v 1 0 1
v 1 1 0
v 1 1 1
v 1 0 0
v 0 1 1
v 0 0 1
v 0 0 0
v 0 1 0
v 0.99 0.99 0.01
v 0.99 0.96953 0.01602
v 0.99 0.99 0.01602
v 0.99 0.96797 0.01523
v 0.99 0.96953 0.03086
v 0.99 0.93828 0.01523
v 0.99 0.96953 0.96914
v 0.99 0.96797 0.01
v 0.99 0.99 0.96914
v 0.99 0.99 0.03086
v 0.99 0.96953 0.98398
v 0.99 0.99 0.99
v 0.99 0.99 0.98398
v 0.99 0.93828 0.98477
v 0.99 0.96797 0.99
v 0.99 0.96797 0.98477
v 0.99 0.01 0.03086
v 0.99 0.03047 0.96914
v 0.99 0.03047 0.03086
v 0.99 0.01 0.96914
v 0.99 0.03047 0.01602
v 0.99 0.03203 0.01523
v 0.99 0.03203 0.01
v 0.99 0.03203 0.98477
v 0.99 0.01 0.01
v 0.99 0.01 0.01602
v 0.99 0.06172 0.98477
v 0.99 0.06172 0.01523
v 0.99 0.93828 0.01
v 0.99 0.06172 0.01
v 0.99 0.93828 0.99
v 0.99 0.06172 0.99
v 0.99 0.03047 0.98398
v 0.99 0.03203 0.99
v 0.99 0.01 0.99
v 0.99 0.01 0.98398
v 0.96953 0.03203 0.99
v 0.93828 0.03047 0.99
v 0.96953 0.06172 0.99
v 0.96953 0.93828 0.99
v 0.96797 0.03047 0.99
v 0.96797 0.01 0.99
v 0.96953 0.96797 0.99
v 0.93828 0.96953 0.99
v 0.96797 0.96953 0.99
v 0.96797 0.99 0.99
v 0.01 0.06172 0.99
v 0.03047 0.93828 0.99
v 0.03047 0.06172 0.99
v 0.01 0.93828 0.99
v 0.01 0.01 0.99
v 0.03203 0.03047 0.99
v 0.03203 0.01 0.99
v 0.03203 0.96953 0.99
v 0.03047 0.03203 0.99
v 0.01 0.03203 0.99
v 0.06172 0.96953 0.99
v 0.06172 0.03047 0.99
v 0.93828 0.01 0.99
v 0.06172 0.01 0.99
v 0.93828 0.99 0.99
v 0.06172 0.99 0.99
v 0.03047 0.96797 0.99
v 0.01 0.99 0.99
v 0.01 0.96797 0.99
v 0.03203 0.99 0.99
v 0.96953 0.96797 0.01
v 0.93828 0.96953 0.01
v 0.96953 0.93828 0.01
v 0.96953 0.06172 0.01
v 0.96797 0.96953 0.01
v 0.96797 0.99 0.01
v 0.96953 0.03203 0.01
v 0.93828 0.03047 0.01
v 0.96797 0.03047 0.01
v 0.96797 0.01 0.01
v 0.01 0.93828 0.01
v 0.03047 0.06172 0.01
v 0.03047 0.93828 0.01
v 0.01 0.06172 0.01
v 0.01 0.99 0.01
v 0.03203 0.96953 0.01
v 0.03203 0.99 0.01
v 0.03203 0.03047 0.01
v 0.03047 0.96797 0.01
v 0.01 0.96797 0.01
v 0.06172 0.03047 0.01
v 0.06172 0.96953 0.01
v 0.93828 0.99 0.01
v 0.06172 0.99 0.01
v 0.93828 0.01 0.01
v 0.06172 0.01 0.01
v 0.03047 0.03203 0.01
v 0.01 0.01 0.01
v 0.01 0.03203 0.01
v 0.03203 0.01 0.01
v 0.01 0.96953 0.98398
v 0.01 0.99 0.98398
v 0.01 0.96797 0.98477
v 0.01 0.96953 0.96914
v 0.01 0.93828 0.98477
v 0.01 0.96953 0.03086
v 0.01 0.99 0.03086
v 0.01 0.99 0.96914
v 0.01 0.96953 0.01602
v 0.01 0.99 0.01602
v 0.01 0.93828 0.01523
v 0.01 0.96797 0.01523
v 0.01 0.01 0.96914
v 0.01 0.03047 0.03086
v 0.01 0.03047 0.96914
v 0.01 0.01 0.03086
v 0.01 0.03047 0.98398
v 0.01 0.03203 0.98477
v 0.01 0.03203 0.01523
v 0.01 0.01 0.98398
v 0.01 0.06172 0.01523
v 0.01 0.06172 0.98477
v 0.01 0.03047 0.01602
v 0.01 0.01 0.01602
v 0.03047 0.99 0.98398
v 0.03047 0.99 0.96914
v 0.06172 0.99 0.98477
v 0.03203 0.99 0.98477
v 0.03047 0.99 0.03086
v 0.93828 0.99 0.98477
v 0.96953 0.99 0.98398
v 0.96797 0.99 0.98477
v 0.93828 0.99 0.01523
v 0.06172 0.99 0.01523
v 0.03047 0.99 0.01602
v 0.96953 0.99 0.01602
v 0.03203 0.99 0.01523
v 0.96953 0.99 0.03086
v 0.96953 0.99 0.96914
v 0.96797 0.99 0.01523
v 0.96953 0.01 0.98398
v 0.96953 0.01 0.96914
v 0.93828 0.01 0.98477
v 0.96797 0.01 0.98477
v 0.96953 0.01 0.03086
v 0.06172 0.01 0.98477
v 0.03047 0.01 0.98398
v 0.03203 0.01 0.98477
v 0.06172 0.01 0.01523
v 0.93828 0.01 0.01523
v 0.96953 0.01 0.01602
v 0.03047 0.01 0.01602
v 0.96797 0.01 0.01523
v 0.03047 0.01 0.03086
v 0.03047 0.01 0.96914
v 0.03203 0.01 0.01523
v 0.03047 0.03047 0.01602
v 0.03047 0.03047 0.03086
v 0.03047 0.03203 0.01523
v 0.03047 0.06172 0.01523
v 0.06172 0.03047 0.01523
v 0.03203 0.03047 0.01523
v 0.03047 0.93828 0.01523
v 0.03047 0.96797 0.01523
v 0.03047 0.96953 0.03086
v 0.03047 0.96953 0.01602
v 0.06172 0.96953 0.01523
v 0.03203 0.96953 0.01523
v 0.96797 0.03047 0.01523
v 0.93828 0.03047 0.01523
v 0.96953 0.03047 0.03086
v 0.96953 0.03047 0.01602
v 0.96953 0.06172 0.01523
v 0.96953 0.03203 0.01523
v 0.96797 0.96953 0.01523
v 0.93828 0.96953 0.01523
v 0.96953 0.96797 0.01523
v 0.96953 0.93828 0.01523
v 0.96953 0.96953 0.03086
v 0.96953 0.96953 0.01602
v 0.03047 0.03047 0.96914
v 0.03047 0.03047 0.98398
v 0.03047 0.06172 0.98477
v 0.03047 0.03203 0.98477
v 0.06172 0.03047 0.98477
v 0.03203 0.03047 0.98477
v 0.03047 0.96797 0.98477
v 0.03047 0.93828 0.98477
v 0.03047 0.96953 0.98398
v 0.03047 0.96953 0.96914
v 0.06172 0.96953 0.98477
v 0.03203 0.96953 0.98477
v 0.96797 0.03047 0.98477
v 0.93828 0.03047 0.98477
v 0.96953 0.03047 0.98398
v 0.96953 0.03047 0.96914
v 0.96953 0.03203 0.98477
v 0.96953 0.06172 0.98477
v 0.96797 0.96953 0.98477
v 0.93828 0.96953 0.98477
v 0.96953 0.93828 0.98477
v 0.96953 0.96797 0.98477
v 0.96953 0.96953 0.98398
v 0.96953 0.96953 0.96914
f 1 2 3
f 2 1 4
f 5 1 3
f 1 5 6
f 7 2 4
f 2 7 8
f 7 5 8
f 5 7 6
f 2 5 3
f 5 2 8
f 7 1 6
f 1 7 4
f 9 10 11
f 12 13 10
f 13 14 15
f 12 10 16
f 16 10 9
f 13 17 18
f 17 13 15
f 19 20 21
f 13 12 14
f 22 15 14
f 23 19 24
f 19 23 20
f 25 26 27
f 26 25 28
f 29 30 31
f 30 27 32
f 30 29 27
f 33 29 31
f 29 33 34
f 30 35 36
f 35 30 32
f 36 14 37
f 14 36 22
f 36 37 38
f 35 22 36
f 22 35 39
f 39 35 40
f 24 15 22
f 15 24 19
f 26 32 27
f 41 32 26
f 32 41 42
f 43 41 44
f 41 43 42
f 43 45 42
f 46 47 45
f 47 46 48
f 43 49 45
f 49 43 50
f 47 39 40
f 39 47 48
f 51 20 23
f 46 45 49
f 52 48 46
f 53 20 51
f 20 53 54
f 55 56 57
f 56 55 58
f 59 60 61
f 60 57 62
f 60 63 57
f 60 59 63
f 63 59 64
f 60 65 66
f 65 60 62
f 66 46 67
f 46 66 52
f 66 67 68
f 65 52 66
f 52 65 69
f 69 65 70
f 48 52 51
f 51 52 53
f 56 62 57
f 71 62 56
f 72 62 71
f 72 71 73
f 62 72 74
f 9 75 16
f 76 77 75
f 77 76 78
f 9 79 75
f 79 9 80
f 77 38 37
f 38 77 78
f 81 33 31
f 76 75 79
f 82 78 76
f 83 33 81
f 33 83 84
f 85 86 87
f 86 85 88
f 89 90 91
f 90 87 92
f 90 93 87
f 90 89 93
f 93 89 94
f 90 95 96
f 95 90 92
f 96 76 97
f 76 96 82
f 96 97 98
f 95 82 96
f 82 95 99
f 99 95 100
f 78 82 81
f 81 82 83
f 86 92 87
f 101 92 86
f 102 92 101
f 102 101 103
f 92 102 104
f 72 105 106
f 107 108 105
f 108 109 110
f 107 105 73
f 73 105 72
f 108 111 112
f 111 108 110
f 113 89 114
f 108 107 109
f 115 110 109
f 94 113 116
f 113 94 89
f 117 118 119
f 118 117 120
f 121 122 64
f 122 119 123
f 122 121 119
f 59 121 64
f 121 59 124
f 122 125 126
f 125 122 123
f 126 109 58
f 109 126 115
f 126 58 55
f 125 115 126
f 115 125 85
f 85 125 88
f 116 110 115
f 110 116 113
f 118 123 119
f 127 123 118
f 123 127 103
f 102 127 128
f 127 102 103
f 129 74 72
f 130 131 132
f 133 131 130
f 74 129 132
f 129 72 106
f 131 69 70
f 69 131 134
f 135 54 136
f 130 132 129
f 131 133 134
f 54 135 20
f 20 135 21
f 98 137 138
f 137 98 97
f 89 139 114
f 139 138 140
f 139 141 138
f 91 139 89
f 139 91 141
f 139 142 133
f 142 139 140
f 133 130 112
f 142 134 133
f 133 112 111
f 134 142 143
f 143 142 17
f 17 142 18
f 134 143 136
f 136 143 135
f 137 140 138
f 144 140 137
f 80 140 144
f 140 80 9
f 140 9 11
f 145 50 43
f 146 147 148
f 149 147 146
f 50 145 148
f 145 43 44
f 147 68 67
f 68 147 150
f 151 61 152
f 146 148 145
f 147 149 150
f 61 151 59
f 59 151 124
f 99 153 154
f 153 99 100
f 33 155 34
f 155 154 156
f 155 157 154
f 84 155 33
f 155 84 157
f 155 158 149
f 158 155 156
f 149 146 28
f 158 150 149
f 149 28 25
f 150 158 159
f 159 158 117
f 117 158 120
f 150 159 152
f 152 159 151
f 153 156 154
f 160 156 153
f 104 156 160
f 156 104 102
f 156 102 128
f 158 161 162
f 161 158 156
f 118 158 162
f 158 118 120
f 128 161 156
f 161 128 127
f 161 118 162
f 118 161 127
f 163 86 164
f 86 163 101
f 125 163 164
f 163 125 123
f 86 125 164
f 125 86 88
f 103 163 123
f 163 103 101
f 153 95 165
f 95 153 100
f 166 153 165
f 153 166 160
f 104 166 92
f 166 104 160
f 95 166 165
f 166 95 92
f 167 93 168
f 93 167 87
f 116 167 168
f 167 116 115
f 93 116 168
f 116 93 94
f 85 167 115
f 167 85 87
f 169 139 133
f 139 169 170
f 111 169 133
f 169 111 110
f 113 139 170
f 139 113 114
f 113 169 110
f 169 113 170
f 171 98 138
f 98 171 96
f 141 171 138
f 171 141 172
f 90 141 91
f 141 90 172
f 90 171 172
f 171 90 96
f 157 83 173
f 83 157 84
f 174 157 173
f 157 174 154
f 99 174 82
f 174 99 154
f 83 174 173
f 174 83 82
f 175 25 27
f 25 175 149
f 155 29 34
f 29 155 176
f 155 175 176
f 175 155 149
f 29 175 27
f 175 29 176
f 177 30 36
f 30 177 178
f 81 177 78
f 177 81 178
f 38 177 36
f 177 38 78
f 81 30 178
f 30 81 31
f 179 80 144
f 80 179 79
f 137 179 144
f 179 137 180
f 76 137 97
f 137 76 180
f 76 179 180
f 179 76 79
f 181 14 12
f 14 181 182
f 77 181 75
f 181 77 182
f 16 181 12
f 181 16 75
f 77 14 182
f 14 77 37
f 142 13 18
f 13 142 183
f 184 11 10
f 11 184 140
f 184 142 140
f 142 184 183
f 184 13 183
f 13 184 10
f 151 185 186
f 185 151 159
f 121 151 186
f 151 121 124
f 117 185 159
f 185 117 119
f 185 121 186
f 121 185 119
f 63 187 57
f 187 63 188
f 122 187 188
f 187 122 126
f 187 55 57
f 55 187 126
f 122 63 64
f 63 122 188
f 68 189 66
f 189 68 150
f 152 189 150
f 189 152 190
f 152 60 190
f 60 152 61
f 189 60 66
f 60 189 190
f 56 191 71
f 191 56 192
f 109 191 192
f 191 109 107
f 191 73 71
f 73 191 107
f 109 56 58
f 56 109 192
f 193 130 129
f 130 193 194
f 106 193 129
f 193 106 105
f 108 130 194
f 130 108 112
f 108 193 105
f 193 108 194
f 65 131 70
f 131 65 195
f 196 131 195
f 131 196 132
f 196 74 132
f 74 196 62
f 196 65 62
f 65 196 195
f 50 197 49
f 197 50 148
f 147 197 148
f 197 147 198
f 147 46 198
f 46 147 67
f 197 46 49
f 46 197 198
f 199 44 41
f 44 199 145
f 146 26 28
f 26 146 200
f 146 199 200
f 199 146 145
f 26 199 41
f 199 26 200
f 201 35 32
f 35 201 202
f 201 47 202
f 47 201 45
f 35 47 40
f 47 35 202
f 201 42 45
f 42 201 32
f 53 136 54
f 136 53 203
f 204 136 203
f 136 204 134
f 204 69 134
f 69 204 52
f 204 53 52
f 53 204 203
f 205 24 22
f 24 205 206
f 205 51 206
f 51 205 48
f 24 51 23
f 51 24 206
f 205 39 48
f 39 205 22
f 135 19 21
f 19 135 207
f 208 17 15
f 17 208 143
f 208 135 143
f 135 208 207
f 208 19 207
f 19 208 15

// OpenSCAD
translate([0.015625, 0.015625, 0.0234375]) color([0.9159839408953577, 0.5842491446465958, 0.794562993834622]) cube([0.0296875, 0.0296875, 0.01484375], center=true);
translate([0.015625, 0.046875, 0.0078125]) color([0.7628318471167657, 0.678963192096452, 0.8649334958146554]) cube([0.0296875, 0.0296875, 0.01484375], center=true);
translate([0.046875, 0.015625, 0.0078125]) color([0.3186621910375238, 0.8354161715679529, 0.826829547153697]) cube([0.0296875, 0.0296875, 0.01484375], center=true);
translate([0.015625, 0.953125, 0.0078125]) color([0.11738075374887624, 0.05498692879855205, 0.6720606658768808]) cube([0.0296875, 0.0296875, 0.01484375], center=true);
translate([0.015625, 0.984375, 0.0234375]) color([0.48227079704185694, 0.2633045439878229, 0.7871728303492512]) cube([0.0296875, 0.0296875, 0.01484375], center=true);
translate([0.046875, 0.984375, 0.0078125]) color([0.4889110107686552, 0.4598642681367189, 0.3017002002562994]) cube([0.0296875, 0.0296875, 0.01484375], center=true);
translate([0.953125, 0.015625, 0.0078125]) color([0.7097667730124154, 0.7732643589874595, 0.6040908296302202]) cube([0.0296875, 0.0296875, 0.01484375], center=true);
translate([0.984375, 0.015625, 0.0234375]) color([0.4404602571783507, 0.4387519946284576, 0.3139475975701921]) cube([0.0296875, 0.0296875, 0.01484375], center=true);
translate([0.984375, 0.046875, 0.0078125]) color([0.7902430565580089, 0.5929973639780046, 0.11888070100193193]) cube([0.0296875, 0.0296875, 0.01484375], center=true);
translate([0.953125, 0.984375, 0.0078125]) color([0.8882067612786162, 0.5183696497459783, 0.37722276013901157]) cube([0.0296875, 0.0296875, 0.01484375], center=true);
translate([0.984375, 0.953125, 0.0078125]) color([0.34378061705655194, 0.680122784193144, 0.28765609338386733]) cube([0.0296875, 0.0296875, 0.01484375], center=true);
translate([0.984375, 0.984375, 0.0234375]) color([0.5132044160193727, 0.948679865315508, 0.5051172012919322]) cube([0.0296875, 0.0296875, 0.01484375], center=true);
translate([0.015625, 0.015625, 0.9765625]) color([0.24094793536178727, 0.7348070855940613, 0.6317801561016791]) cube([0.0296875, 0.0296875, 0.01484375], center=true);
translate([0.015625, 0.046875, 0.9921875]) color([0.4449433647546056, 0.9178984262554764, 0.13307521746456363]) cube([0.0296875, 0.0296875, 0.01484375], center=true);
translate([0.046875, 0.015625, 0.9921875]) color([0.7079100199767676, 0.1836532406516047, 0.9272673117871152]) cube([0.0296875, 0.0296875, 0.01484375], center=true);
translate([0.015625, 0.953125, 0.9921875]) color([0.9770711363883782, 0.21964399595921047, 0.7456964983989979]) cube([0.0296875, 0.0296875, 0.01484375], center=true);
translate([0.015625, 0.984375, 0.9765625]) color([0.7954513816773767, 0.1942374150489241, 0.9252283668735345]) cube([0.0296875, 0.0296875, 0.01484375], center=true);
translate([0.046875, 0.984375, 0.9921875]) color([0.24707526929440882, 0.9142504937868682, 0.12304511653468275]) cube([0.0296875, 0.0296875, 0.01484375], center=true);
translate([0.953125, 0.015625, 0.9921875]) color([0.9051447468246127, 0.6595353734608235, 0.039161747535802816]) cube([0.0296875, 0.0296875, 0.01484375], center=true);
translate([0.984375, 0.015625, 0.9765625]) color([0.6753764825819706, 0.6126312841298749, 0.5972284068954468]) cube([0.0296875, 0.0296875, 0.01484375], center=true);
translate([0.984375, 0.046875, 0.9921875]) color([0.575494251677081, 0.6209062143421671, 0.5607035836002754]) cube([0.0296875, 0.0296875, 0.01484375], center=true);
translate([0.953125, 0.984375, 0.9921875]) color([0.17543269760892544, 0.41434670023132203, 0.7958240628465897]) cube([0.0296875, 0.0296875, 0.01484375], center=true);
translate([0.984375, 0.953125, 0.9921875]) color([0.7910335349964853, 0.16017955018330032, 0.8282713893103373]) cube([0.0296875, 0.0296875, 0.01484375], center=true);
translate([0.984375, 0.984375, 0.9765625]) color([0.02874231659575055, 0.6198272226183867, 0.9531142770071671]) cube([0.0296875, 0.0296875, 0.01484375], center=true);
color([0.3,0.3,0.3,0.3]) difference() { cube([1,1,1]); translate([0.01,0.01,0.01]) cube([0.98,0.98,0.98]); }
